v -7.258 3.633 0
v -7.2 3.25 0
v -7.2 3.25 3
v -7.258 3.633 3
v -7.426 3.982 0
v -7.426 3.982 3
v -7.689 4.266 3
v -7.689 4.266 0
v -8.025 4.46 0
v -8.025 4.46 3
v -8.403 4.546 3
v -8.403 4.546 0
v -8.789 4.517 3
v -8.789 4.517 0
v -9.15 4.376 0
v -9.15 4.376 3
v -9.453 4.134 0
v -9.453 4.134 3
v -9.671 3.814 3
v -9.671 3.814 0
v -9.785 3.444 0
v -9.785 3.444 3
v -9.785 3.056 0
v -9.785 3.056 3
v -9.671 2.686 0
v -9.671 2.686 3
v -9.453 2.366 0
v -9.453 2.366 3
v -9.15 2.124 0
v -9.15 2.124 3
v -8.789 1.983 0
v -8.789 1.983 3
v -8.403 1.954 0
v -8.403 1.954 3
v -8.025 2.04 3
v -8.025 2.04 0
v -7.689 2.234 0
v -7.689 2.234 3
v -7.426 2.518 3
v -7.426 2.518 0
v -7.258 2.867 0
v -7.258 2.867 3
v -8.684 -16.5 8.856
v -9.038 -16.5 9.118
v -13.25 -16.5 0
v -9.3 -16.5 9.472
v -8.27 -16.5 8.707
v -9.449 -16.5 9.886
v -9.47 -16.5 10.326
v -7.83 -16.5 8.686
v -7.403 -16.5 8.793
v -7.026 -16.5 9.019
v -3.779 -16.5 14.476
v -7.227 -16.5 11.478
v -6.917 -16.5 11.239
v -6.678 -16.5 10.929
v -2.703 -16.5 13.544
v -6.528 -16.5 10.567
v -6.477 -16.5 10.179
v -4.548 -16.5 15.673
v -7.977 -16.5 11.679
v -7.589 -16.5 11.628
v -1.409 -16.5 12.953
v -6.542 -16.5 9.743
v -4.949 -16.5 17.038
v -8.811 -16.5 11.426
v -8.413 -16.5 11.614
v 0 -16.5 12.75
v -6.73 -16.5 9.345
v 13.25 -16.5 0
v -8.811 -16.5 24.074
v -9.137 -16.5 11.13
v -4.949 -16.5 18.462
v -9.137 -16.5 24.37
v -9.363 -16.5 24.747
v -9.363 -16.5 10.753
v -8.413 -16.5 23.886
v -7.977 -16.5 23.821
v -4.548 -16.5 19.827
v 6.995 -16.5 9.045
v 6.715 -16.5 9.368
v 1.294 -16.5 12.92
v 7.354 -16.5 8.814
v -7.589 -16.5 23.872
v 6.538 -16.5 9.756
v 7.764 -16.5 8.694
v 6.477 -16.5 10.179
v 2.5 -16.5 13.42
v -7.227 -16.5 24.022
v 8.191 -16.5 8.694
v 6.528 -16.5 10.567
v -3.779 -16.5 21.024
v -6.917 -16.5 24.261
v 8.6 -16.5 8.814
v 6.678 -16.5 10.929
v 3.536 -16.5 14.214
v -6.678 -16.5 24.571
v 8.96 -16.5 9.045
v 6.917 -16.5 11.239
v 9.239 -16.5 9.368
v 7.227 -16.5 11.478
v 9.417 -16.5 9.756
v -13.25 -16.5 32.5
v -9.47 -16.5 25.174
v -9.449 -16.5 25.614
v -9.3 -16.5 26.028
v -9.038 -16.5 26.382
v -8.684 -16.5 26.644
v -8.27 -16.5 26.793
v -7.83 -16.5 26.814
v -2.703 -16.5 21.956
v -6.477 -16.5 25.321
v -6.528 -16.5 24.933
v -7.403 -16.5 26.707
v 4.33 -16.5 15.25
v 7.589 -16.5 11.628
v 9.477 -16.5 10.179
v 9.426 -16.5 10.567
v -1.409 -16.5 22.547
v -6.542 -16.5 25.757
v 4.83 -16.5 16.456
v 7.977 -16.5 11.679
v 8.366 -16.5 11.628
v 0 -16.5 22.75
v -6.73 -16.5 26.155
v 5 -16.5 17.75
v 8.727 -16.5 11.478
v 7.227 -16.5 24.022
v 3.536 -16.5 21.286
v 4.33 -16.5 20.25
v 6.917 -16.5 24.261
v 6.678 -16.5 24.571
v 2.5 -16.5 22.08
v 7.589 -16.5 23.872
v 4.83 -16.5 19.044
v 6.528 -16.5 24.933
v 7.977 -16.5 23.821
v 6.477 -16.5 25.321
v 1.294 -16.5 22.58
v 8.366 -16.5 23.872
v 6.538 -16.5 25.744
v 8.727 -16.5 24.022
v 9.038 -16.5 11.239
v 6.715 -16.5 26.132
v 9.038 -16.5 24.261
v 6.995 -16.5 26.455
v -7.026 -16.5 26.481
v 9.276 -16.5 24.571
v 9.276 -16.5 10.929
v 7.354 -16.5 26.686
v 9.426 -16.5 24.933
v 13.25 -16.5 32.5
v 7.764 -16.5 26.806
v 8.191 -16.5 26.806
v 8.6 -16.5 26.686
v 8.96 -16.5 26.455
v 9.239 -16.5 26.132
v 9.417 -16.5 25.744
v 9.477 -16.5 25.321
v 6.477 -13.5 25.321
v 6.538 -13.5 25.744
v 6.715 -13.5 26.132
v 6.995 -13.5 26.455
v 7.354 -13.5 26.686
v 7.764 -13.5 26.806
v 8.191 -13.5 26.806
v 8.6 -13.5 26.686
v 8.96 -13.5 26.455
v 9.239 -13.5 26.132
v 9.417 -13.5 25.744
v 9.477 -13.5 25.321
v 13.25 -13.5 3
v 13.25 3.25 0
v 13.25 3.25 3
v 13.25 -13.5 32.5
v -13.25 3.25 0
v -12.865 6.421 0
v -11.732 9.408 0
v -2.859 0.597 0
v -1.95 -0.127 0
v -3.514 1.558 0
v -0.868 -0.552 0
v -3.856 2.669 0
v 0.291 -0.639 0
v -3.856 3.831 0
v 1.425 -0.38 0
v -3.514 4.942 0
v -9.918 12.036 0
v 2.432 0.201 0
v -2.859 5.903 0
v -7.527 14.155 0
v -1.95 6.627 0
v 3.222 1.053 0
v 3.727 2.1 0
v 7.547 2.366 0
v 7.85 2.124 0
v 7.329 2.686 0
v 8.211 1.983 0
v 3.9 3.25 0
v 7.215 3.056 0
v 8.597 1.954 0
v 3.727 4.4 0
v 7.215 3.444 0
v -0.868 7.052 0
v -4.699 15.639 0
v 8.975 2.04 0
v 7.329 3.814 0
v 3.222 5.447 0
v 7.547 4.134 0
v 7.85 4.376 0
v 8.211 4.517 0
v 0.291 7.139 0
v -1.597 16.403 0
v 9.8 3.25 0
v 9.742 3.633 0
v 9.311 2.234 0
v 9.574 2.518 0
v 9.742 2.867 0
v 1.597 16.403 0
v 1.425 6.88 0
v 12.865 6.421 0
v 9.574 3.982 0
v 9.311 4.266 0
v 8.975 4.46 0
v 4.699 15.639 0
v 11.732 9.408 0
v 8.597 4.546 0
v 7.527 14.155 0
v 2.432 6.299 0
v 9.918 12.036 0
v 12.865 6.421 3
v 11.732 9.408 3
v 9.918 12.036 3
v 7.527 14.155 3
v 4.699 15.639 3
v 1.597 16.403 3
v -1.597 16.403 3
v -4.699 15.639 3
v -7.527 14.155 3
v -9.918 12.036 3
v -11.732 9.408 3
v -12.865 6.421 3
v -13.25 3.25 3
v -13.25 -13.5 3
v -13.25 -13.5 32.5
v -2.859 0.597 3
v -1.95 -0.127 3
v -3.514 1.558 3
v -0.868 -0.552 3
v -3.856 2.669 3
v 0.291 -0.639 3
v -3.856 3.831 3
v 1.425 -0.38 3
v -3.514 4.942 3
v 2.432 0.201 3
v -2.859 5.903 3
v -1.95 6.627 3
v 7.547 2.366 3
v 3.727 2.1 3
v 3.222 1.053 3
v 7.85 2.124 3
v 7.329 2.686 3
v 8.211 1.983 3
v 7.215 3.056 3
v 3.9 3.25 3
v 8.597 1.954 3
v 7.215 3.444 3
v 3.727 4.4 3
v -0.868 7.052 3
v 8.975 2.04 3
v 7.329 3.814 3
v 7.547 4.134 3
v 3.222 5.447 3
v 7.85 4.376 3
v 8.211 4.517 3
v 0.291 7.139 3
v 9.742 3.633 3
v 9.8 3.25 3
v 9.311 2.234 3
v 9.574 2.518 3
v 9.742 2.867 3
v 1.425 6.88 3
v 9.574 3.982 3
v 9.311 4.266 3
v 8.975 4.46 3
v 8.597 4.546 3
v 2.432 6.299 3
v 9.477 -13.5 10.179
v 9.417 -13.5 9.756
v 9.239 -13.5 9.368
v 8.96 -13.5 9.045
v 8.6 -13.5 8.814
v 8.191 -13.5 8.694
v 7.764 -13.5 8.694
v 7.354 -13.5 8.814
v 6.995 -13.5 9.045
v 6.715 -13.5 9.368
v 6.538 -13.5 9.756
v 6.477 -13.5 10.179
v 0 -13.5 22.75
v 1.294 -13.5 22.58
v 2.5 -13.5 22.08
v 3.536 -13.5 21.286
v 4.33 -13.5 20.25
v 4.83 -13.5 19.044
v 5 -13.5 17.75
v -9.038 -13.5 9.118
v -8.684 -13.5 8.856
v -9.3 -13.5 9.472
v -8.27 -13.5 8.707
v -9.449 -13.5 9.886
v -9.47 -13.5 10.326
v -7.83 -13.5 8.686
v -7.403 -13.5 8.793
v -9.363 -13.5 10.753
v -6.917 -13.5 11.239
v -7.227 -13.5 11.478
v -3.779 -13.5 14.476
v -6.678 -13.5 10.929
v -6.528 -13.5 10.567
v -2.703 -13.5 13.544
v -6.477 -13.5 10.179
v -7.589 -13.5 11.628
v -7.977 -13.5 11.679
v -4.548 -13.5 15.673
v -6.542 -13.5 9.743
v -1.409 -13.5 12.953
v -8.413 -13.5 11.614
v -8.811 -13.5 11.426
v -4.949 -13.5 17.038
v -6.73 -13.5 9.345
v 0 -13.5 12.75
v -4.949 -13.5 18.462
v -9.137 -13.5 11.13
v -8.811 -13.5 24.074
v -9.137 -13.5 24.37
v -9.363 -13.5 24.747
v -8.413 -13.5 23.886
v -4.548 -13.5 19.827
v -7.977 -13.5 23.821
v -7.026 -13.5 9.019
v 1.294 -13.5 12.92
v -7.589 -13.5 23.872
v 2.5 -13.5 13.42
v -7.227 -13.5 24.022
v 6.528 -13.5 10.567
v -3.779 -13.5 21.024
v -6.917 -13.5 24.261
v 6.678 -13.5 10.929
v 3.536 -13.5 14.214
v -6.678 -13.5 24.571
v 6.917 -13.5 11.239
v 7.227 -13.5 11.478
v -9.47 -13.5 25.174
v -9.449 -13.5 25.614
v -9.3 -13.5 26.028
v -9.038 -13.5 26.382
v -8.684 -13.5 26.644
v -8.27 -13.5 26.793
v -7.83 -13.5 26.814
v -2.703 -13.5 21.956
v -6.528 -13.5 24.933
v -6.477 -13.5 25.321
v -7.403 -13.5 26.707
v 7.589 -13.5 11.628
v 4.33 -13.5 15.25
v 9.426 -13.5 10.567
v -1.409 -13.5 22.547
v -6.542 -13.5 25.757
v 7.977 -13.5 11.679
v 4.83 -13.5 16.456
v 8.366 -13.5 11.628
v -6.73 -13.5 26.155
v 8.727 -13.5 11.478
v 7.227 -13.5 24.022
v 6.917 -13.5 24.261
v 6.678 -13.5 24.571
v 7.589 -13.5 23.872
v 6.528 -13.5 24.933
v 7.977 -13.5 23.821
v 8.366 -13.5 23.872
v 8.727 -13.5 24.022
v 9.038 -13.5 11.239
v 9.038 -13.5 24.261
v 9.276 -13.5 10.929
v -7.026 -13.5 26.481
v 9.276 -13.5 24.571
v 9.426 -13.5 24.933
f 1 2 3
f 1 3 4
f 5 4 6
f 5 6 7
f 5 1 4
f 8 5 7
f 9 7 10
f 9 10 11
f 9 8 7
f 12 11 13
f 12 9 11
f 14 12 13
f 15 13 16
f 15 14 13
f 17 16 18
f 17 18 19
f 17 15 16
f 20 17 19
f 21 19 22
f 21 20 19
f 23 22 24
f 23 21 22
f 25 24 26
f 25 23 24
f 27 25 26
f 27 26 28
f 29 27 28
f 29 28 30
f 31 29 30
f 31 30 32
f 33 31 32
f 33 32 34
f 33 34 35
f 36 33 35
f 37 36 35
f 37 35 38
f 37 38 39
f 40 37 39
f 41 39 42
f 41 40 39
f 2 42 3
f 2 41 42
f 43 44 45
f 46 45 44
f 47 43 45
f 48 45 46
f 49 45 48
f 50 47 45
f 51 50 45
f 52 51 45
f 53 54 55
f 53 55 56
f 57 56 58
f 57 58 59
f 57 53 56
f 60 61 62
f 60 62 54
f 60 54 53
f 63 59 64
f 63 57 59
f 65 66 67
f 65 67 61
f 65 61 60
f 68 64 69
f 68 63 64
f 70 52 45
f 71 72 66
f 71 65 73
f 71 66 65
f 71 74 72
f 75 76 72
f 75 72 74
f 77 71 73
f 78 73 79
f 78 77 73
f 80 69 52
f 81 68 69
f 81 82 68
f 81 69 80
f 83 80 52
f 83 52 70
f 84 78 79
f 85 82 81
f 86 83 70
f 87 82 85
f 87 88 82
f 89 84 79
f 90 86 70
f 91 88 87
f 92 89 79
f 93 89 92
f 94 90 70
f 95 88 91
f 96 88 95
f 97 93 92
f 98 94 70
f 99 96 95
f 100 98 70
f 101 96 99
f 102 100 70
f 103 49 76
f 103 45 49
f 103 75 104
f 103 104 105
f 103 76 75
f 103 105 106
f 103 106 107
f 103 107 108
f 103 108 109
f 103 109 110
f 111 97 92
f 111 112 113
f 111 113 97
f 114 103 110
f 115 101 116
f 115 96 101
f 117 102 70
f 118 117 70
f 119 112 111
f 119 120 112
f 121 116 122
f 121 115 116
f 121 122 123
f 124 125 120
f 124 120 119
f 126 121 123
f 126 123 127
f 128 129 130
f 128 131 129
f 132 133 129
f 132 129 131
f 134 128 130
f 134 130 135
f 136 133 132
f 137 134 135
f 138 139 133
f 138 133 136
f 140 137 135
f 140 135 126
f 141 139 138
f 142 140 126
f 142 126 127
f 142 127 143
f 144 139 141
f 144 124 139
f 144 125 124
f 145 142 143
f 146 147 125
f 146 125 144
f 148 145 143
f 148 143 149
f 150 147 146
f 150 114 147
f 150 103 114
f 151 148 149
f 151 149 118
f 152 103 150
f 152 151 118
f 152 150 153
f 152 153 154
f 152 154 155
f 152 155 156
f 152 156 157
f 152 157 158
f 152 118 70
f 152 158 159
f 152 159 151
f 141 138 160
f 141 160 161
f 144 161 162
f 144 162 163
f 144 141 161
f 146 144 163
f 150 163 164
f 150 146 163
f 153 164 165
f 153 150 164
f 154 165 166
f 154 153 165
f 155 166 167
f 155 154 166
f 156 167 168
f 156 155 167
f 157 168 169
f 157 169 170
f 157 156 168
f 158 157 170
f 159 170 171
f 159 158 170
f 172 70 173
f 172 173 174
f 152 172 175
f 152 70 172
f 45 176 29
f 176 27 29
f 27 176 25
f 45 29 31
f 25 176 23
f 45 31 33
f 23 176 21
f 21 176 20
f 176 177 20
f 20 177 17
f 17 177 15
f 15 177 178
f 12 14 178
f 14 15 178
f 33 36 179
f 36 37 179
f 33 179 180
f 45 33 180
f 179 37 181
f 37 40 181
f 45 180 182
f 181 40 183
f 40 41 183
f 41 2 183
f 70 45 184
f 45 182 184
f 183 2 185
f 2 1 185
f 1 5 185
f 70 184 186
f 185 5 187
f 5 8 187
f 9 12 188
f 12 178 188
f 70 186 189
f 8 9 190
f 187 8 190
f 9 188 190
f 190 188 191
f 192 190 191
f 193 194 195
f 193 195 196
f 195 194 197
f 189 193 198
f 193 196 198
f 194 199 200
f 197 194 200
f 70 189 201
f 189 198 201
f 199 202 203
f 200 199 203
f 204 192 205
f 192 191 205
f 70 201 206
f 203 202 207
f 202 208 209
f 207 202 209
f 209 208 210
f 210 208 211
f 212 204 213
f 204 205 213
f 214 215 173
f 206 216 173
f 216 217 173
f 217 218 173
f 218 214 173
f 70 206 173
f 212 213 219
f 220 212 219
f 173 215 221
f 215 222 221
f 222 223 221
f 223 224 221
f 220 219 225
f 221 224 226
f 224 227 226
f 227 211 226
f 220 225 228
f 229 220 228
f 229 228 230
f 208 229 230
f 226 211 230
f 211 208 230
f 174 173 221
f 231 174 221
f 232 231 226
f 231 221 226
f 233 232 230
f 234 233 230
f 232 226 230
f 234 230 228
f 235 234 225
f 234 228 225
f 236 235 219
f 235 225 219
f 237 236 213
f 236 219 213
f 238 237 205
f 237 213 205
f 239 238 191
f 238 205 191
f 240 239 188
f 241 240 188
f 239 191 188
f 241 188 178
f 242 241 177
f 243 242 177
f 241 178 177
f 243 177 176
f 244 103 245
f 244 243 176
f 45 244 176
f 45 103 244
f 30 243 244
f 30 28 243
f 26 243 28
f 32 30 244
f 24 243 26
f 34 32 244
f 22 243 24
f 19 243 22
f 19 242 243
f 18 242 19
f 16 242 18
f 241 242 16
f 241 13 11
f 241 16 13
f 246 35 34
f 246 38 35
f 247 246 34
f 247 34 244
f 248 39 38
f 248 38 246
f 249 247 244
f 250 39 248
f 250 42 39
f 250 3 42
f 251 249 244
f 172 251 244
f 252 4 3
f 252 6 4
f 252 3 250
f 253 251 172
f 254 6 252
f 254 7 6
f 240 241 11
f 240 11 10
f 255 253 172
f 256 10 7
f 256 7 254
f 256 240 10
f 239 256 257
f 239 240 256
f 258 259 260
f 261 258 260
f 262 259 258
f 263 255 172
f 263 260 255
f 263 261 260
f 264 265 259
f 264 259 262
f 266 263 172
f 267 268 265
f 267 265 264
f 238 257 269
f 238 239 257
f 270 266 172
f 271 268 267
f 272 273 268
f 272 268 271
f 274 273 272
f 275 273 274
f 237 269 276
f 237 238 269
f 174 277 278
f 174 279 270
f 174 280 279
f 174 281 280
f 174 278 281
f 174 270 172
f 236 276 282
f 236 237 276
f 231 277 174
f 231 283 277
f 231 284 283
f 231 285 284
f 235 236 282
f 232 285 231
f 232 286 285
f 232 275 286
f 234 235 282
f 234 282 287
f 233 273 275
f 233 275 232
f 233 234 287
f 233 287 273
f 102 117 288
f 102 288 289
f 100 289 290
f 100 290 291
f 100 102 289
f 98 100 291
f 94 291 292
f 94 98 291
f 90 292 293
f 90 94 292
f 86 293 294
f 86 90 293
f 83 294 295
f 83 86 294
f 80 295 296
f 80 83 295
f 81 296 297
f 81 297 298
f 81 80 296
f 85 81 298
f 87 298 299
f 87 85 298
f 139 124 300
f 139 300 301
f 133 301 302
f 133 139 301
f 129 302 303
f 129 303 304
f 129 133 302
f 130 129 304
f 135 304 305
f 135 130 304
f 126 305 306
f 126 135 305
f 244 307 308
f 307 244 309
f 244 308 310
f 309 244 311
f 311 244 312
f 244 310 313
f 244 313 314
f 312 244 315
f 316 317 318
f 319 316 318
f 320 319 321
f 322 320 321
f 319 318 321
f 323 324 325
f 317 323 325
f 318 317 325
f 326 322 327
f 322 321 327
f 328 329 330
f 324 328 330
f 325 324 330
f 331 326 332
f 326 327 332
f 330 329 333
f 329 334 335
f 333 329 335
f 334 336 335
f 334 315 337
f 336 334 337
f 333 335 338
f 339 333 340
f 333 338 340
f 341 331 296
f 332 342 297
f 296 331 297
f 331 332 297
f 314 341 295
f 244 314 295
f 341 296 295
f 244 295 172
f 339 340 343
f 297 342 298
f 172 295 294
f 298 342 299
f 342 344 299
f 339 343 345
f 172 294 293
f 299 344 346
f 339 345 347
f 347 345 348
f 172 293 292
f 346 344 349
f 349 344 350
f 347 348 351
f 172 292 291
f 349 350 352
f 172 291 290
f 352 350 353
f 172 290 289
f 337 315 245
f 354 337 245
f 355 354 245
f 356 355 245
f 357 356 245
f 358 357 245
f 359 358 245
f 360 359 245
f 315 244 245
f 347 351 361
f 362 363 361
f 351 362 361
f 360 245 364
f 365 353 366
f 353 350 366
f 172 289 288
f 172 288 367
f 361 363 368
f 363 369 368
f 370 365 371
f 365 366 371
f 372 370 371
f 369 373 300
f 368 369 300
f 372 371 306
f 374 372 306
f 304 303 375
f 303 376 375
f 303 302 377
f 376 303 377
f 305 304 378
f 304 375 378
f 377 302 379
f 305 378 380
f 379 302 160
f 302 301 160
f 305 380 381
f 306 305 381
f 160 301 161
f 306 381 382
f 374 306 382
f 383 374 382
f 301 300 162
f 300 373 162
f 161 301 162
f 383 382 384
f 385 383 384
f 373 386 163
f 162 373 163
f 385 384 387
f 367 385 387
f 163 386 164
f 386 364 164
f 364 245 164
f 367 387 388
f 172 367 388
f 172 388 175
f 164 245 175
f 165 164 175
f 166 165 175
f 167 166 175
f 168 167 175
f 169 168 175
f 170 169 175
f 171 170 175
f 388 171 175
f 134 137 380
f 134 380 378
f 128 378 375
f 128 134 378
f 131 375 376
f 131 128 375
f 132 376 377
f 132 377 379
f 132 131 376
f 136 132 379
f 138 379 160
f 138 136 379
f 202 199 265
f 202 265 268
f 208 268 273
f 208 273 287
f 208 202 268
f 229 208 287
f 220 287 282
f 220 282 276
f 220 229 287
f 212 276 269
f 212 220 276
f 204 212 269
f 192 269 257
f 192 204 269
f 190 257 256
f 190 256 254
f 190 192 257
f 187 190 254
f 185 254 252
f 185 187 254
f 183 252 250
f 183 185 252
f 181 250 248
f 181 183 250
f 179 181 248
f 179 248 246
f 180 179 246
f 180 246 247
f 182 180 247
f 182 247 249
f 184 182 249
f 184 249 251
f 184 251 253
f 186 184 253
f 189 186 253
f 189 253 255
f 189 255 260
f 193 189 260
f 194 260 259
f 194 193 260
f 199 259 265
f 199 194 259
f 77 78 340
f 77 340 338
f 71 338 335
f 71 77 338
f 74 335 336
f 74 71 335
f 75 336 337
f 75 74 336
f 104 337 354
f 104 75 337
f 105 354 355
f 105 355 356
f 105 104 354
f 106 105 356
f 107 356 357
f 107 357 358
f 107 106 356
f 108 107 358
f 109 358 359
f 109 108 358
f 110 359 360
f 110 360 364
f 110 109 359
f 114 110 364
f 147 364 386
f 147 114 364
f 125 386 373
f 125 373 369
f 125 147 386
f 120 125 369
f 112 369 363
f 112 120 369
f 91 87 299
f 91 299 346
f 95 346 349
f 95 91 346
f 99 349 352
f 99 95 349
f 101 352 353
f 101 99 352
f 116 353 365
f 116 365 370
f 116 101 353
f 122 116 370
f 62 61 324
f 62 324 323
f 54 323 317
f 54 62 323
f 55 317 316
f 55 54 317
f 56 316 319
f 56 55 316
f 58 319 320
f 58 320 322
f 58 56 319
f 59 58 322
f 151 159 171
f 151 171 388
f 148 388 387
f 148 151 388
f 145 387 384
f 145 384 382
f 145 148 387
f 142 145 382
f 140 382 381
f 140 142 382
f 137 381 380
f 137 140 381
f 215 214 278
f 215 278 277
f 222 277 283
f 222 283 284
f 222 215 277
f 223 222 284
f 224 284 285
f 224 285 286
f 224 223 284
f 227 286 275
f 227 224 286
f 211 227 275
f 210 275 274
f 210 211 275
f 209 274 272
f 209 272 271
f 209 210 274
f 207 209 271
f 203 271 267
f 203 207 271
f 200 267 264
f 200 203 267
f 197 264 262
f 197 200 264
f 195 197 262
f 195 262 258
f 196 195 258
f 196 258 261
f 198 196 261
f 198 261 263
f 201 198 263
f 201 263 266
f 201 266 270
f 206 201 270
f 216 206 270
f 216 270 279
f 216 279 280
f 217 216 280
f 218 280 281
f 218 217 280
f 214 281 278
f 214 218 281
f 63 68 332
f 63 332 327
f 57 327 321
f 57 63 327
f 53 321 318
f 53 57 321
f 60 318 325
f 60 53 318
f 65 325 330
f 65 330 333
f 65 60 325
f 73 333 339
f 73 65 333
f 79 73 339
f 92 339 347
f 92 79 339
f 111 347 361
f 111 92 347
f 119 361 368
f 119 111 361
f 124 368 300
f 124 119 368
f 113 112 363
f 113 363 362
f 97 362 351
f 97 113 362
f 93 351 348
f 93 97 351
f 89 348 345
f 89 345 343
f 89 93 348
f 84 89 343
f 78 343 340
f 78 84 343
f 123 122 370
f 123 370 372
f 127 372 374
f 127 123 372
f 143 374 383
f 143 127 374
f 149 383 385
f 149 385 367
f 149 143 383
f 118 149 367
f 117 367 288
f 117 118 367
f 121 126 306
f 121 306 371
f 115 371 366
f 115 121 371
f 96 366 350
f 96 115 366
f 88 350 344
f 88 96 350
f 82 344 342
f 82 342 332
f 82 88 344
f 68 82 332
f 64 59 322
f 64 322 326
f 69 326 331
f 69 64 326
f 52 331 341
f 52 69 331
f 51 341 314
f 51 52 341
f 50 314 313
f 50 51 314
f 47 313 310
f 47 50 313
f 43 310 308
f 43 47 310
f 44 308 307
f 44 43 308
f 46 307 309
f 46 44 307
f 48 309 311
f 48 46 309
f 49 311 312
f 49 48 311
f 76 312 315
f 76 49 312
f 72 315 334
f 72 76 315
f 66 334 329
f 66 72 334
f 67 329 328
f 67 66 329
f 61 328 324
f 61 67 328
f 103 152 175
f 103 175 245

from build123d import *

# Parameters (mm, degrees)
SKETCH1_R           = 13.25
SKETCH1_R_2         = 1.3
SKETCH1_R_3         = 3.9
BOSS_EXTRUDE1_DEPTH = 3
BOSS_EXTRUDE2_DEPTH = 3


with BuildPart() as part:
    # Sketch1 → Boss-Extrude1 (new body)
    # profile 1 of 2: a face of its own
    with BuildSketch(Plane.XY):
        with Locations((0, 3.25)):
            Circle(SKETCH1_R)
        with Locations((8.5, 3.25)):
            Circle(SKETCH1_R_2, mode=Mode.SUBTRACT)
        with Locations((-8.5, 3.25)):
            Circle(SKETCH1_R_2, mode=Mode.SUBTRACT)
        with Locations((0, 3.25)):
            Circle(SKETCH1_R_3, mode=Mode.SUBTRACT)
    # profile 2 of 2: a face of its own
    with BuildSketch(Plane.XY):
        with BuildLine():
            Line((-13.25, 3.249999993), (-13.25, -16.5))
            Line((-13.25, -16.5), (13.25, -16.5))
            Line((13.25, -16.5), (13.25, 3.25))
            ThreePointArc((13.25, 3.25), (4e-09, -10), (-13.25, 3.249999993))
        make_face()
    extrude(amount=BOSS_EXTRUDE1_DEPTH)

    # Sketch2 → Boss-Extrude2 (add)
    with BuildSketch(Plane.XZ.offset(16.5)):
        with BuildLine():
            Line((0, 32.5), (-13.25, 32.5))
            Line((-13.25, 32.5), (-13.25, 3))
            Line((-13.25, 3), (0, 3))
            Line((0, 3), (0, 10.178644607))
            Line((0, 10.178644607), (-6.477335786, 10.178644607))
            ThreePointArc((-6.477335786, 10.178644607), (-9.037995958, 9.117984436), (-7.977335786, 11.678644607))
            Line((-7.977335786, 11.678644607), (-7.977335786, 23.821355393))
            ThreePointArc((-7.977335786, 23.821355393), (-9.037995958, 26.382015564), (-6.477335786, 25.321355393))
            Line((-6.477335786, 25.321355393), (0, 25.321355393))
            Line((0, 25.321355393), (0, 32.5))
        make_face()
        with BuildLine():
            Line((13.25, 32.5), (0, 32.5))
            Line((0, 32.5), (0, 25.321355393))
            Line((0, 25.321355393), (6.477335786, 25.321355393))
            ThreePointArc((6.477335786, 25.321355393), (7.977335786, 26.821355393), (9.477335786, 25.321355393))
            ThreePointArc((9.477335786, 25.321355393), (9.037995958, 24.260695221), (7.977335786, 23.821355393))
            Line((7.977335786, 23.821355393), (7.977335786, 11.678644607))
            ThreePointArc((7.977335786, 11.678644607), (9.037995958, 11.239304779), (9.477335786, 10.178644607))
            ThreePointArc((9.477335786, 10.178644607), (7.977335786, 8.678644607), (6.477335786, 10.178644607))
            Line((6.477335786, 10.178644607), (0, 10.178644607))
            Line((0, 10.178644607), (0, 3))
            Line((0, 3), (13.25, 3))
            Line((13.25, 3), (13.25, 32.5))
        make_face()
        with BuildLine():
            Line((6.477335786, 25.321355393), (0, 25.321355393))
            Line((0, 25.321355393), (0, 22.75))
            ThreePointArc((0, 22.75), (3.535533906, 21.285533906), (5, 17.75))
            ThreePointArc((5, 17.75), (3.535533906, 14.214466094), (0, 12.75))
            Line((0, 12.75), (0, 10.178644607))
            Line((0, 10.178644607), (6.477335786, 10.178644607))
            ThreePointArc((6.477335786, 10.178644607), (6.916675614, 11.239304779), (7.977335786, 11.678644607))
            Line((7.977335786, 11.678644607), (7.977335786, 23.821355393))
            ThreePointArc((7.977335786, 23.821355393), (6.916675614, 24.260695221), (6.477335786, 25.321355393))
        make_face()
        with BuildLine():
            Line((0, 22.75), (0, 25.321355393))
            Line((0, 25.321355393), (-6.477335786, 25.321355393))
            ThreePointArc((-6.477335786, 25.321355393), (-6.916675614, 24.260695221), (-7.977335786, 23.821355393))
            Line((-7.977335786, 23.821355393), (-7.977335786, 11.678644607))
            ThreePointArc((-7.977335786, 11.678644607), (-6.916675614, 11.239304779), (-6.477335786, 10.178644607))
            Line((-6.477335786, 10.178644607), (0, 10.178644607))
            Line((0, 10.178644607), (0, 12.75))
            ThreePointArc((0, 12.75), (-5, 17.75), (0, 22.75))
        make_face()
    extrude(amount=-BOSS_EXTRUDE2_DEPTH)


solid = part.part
